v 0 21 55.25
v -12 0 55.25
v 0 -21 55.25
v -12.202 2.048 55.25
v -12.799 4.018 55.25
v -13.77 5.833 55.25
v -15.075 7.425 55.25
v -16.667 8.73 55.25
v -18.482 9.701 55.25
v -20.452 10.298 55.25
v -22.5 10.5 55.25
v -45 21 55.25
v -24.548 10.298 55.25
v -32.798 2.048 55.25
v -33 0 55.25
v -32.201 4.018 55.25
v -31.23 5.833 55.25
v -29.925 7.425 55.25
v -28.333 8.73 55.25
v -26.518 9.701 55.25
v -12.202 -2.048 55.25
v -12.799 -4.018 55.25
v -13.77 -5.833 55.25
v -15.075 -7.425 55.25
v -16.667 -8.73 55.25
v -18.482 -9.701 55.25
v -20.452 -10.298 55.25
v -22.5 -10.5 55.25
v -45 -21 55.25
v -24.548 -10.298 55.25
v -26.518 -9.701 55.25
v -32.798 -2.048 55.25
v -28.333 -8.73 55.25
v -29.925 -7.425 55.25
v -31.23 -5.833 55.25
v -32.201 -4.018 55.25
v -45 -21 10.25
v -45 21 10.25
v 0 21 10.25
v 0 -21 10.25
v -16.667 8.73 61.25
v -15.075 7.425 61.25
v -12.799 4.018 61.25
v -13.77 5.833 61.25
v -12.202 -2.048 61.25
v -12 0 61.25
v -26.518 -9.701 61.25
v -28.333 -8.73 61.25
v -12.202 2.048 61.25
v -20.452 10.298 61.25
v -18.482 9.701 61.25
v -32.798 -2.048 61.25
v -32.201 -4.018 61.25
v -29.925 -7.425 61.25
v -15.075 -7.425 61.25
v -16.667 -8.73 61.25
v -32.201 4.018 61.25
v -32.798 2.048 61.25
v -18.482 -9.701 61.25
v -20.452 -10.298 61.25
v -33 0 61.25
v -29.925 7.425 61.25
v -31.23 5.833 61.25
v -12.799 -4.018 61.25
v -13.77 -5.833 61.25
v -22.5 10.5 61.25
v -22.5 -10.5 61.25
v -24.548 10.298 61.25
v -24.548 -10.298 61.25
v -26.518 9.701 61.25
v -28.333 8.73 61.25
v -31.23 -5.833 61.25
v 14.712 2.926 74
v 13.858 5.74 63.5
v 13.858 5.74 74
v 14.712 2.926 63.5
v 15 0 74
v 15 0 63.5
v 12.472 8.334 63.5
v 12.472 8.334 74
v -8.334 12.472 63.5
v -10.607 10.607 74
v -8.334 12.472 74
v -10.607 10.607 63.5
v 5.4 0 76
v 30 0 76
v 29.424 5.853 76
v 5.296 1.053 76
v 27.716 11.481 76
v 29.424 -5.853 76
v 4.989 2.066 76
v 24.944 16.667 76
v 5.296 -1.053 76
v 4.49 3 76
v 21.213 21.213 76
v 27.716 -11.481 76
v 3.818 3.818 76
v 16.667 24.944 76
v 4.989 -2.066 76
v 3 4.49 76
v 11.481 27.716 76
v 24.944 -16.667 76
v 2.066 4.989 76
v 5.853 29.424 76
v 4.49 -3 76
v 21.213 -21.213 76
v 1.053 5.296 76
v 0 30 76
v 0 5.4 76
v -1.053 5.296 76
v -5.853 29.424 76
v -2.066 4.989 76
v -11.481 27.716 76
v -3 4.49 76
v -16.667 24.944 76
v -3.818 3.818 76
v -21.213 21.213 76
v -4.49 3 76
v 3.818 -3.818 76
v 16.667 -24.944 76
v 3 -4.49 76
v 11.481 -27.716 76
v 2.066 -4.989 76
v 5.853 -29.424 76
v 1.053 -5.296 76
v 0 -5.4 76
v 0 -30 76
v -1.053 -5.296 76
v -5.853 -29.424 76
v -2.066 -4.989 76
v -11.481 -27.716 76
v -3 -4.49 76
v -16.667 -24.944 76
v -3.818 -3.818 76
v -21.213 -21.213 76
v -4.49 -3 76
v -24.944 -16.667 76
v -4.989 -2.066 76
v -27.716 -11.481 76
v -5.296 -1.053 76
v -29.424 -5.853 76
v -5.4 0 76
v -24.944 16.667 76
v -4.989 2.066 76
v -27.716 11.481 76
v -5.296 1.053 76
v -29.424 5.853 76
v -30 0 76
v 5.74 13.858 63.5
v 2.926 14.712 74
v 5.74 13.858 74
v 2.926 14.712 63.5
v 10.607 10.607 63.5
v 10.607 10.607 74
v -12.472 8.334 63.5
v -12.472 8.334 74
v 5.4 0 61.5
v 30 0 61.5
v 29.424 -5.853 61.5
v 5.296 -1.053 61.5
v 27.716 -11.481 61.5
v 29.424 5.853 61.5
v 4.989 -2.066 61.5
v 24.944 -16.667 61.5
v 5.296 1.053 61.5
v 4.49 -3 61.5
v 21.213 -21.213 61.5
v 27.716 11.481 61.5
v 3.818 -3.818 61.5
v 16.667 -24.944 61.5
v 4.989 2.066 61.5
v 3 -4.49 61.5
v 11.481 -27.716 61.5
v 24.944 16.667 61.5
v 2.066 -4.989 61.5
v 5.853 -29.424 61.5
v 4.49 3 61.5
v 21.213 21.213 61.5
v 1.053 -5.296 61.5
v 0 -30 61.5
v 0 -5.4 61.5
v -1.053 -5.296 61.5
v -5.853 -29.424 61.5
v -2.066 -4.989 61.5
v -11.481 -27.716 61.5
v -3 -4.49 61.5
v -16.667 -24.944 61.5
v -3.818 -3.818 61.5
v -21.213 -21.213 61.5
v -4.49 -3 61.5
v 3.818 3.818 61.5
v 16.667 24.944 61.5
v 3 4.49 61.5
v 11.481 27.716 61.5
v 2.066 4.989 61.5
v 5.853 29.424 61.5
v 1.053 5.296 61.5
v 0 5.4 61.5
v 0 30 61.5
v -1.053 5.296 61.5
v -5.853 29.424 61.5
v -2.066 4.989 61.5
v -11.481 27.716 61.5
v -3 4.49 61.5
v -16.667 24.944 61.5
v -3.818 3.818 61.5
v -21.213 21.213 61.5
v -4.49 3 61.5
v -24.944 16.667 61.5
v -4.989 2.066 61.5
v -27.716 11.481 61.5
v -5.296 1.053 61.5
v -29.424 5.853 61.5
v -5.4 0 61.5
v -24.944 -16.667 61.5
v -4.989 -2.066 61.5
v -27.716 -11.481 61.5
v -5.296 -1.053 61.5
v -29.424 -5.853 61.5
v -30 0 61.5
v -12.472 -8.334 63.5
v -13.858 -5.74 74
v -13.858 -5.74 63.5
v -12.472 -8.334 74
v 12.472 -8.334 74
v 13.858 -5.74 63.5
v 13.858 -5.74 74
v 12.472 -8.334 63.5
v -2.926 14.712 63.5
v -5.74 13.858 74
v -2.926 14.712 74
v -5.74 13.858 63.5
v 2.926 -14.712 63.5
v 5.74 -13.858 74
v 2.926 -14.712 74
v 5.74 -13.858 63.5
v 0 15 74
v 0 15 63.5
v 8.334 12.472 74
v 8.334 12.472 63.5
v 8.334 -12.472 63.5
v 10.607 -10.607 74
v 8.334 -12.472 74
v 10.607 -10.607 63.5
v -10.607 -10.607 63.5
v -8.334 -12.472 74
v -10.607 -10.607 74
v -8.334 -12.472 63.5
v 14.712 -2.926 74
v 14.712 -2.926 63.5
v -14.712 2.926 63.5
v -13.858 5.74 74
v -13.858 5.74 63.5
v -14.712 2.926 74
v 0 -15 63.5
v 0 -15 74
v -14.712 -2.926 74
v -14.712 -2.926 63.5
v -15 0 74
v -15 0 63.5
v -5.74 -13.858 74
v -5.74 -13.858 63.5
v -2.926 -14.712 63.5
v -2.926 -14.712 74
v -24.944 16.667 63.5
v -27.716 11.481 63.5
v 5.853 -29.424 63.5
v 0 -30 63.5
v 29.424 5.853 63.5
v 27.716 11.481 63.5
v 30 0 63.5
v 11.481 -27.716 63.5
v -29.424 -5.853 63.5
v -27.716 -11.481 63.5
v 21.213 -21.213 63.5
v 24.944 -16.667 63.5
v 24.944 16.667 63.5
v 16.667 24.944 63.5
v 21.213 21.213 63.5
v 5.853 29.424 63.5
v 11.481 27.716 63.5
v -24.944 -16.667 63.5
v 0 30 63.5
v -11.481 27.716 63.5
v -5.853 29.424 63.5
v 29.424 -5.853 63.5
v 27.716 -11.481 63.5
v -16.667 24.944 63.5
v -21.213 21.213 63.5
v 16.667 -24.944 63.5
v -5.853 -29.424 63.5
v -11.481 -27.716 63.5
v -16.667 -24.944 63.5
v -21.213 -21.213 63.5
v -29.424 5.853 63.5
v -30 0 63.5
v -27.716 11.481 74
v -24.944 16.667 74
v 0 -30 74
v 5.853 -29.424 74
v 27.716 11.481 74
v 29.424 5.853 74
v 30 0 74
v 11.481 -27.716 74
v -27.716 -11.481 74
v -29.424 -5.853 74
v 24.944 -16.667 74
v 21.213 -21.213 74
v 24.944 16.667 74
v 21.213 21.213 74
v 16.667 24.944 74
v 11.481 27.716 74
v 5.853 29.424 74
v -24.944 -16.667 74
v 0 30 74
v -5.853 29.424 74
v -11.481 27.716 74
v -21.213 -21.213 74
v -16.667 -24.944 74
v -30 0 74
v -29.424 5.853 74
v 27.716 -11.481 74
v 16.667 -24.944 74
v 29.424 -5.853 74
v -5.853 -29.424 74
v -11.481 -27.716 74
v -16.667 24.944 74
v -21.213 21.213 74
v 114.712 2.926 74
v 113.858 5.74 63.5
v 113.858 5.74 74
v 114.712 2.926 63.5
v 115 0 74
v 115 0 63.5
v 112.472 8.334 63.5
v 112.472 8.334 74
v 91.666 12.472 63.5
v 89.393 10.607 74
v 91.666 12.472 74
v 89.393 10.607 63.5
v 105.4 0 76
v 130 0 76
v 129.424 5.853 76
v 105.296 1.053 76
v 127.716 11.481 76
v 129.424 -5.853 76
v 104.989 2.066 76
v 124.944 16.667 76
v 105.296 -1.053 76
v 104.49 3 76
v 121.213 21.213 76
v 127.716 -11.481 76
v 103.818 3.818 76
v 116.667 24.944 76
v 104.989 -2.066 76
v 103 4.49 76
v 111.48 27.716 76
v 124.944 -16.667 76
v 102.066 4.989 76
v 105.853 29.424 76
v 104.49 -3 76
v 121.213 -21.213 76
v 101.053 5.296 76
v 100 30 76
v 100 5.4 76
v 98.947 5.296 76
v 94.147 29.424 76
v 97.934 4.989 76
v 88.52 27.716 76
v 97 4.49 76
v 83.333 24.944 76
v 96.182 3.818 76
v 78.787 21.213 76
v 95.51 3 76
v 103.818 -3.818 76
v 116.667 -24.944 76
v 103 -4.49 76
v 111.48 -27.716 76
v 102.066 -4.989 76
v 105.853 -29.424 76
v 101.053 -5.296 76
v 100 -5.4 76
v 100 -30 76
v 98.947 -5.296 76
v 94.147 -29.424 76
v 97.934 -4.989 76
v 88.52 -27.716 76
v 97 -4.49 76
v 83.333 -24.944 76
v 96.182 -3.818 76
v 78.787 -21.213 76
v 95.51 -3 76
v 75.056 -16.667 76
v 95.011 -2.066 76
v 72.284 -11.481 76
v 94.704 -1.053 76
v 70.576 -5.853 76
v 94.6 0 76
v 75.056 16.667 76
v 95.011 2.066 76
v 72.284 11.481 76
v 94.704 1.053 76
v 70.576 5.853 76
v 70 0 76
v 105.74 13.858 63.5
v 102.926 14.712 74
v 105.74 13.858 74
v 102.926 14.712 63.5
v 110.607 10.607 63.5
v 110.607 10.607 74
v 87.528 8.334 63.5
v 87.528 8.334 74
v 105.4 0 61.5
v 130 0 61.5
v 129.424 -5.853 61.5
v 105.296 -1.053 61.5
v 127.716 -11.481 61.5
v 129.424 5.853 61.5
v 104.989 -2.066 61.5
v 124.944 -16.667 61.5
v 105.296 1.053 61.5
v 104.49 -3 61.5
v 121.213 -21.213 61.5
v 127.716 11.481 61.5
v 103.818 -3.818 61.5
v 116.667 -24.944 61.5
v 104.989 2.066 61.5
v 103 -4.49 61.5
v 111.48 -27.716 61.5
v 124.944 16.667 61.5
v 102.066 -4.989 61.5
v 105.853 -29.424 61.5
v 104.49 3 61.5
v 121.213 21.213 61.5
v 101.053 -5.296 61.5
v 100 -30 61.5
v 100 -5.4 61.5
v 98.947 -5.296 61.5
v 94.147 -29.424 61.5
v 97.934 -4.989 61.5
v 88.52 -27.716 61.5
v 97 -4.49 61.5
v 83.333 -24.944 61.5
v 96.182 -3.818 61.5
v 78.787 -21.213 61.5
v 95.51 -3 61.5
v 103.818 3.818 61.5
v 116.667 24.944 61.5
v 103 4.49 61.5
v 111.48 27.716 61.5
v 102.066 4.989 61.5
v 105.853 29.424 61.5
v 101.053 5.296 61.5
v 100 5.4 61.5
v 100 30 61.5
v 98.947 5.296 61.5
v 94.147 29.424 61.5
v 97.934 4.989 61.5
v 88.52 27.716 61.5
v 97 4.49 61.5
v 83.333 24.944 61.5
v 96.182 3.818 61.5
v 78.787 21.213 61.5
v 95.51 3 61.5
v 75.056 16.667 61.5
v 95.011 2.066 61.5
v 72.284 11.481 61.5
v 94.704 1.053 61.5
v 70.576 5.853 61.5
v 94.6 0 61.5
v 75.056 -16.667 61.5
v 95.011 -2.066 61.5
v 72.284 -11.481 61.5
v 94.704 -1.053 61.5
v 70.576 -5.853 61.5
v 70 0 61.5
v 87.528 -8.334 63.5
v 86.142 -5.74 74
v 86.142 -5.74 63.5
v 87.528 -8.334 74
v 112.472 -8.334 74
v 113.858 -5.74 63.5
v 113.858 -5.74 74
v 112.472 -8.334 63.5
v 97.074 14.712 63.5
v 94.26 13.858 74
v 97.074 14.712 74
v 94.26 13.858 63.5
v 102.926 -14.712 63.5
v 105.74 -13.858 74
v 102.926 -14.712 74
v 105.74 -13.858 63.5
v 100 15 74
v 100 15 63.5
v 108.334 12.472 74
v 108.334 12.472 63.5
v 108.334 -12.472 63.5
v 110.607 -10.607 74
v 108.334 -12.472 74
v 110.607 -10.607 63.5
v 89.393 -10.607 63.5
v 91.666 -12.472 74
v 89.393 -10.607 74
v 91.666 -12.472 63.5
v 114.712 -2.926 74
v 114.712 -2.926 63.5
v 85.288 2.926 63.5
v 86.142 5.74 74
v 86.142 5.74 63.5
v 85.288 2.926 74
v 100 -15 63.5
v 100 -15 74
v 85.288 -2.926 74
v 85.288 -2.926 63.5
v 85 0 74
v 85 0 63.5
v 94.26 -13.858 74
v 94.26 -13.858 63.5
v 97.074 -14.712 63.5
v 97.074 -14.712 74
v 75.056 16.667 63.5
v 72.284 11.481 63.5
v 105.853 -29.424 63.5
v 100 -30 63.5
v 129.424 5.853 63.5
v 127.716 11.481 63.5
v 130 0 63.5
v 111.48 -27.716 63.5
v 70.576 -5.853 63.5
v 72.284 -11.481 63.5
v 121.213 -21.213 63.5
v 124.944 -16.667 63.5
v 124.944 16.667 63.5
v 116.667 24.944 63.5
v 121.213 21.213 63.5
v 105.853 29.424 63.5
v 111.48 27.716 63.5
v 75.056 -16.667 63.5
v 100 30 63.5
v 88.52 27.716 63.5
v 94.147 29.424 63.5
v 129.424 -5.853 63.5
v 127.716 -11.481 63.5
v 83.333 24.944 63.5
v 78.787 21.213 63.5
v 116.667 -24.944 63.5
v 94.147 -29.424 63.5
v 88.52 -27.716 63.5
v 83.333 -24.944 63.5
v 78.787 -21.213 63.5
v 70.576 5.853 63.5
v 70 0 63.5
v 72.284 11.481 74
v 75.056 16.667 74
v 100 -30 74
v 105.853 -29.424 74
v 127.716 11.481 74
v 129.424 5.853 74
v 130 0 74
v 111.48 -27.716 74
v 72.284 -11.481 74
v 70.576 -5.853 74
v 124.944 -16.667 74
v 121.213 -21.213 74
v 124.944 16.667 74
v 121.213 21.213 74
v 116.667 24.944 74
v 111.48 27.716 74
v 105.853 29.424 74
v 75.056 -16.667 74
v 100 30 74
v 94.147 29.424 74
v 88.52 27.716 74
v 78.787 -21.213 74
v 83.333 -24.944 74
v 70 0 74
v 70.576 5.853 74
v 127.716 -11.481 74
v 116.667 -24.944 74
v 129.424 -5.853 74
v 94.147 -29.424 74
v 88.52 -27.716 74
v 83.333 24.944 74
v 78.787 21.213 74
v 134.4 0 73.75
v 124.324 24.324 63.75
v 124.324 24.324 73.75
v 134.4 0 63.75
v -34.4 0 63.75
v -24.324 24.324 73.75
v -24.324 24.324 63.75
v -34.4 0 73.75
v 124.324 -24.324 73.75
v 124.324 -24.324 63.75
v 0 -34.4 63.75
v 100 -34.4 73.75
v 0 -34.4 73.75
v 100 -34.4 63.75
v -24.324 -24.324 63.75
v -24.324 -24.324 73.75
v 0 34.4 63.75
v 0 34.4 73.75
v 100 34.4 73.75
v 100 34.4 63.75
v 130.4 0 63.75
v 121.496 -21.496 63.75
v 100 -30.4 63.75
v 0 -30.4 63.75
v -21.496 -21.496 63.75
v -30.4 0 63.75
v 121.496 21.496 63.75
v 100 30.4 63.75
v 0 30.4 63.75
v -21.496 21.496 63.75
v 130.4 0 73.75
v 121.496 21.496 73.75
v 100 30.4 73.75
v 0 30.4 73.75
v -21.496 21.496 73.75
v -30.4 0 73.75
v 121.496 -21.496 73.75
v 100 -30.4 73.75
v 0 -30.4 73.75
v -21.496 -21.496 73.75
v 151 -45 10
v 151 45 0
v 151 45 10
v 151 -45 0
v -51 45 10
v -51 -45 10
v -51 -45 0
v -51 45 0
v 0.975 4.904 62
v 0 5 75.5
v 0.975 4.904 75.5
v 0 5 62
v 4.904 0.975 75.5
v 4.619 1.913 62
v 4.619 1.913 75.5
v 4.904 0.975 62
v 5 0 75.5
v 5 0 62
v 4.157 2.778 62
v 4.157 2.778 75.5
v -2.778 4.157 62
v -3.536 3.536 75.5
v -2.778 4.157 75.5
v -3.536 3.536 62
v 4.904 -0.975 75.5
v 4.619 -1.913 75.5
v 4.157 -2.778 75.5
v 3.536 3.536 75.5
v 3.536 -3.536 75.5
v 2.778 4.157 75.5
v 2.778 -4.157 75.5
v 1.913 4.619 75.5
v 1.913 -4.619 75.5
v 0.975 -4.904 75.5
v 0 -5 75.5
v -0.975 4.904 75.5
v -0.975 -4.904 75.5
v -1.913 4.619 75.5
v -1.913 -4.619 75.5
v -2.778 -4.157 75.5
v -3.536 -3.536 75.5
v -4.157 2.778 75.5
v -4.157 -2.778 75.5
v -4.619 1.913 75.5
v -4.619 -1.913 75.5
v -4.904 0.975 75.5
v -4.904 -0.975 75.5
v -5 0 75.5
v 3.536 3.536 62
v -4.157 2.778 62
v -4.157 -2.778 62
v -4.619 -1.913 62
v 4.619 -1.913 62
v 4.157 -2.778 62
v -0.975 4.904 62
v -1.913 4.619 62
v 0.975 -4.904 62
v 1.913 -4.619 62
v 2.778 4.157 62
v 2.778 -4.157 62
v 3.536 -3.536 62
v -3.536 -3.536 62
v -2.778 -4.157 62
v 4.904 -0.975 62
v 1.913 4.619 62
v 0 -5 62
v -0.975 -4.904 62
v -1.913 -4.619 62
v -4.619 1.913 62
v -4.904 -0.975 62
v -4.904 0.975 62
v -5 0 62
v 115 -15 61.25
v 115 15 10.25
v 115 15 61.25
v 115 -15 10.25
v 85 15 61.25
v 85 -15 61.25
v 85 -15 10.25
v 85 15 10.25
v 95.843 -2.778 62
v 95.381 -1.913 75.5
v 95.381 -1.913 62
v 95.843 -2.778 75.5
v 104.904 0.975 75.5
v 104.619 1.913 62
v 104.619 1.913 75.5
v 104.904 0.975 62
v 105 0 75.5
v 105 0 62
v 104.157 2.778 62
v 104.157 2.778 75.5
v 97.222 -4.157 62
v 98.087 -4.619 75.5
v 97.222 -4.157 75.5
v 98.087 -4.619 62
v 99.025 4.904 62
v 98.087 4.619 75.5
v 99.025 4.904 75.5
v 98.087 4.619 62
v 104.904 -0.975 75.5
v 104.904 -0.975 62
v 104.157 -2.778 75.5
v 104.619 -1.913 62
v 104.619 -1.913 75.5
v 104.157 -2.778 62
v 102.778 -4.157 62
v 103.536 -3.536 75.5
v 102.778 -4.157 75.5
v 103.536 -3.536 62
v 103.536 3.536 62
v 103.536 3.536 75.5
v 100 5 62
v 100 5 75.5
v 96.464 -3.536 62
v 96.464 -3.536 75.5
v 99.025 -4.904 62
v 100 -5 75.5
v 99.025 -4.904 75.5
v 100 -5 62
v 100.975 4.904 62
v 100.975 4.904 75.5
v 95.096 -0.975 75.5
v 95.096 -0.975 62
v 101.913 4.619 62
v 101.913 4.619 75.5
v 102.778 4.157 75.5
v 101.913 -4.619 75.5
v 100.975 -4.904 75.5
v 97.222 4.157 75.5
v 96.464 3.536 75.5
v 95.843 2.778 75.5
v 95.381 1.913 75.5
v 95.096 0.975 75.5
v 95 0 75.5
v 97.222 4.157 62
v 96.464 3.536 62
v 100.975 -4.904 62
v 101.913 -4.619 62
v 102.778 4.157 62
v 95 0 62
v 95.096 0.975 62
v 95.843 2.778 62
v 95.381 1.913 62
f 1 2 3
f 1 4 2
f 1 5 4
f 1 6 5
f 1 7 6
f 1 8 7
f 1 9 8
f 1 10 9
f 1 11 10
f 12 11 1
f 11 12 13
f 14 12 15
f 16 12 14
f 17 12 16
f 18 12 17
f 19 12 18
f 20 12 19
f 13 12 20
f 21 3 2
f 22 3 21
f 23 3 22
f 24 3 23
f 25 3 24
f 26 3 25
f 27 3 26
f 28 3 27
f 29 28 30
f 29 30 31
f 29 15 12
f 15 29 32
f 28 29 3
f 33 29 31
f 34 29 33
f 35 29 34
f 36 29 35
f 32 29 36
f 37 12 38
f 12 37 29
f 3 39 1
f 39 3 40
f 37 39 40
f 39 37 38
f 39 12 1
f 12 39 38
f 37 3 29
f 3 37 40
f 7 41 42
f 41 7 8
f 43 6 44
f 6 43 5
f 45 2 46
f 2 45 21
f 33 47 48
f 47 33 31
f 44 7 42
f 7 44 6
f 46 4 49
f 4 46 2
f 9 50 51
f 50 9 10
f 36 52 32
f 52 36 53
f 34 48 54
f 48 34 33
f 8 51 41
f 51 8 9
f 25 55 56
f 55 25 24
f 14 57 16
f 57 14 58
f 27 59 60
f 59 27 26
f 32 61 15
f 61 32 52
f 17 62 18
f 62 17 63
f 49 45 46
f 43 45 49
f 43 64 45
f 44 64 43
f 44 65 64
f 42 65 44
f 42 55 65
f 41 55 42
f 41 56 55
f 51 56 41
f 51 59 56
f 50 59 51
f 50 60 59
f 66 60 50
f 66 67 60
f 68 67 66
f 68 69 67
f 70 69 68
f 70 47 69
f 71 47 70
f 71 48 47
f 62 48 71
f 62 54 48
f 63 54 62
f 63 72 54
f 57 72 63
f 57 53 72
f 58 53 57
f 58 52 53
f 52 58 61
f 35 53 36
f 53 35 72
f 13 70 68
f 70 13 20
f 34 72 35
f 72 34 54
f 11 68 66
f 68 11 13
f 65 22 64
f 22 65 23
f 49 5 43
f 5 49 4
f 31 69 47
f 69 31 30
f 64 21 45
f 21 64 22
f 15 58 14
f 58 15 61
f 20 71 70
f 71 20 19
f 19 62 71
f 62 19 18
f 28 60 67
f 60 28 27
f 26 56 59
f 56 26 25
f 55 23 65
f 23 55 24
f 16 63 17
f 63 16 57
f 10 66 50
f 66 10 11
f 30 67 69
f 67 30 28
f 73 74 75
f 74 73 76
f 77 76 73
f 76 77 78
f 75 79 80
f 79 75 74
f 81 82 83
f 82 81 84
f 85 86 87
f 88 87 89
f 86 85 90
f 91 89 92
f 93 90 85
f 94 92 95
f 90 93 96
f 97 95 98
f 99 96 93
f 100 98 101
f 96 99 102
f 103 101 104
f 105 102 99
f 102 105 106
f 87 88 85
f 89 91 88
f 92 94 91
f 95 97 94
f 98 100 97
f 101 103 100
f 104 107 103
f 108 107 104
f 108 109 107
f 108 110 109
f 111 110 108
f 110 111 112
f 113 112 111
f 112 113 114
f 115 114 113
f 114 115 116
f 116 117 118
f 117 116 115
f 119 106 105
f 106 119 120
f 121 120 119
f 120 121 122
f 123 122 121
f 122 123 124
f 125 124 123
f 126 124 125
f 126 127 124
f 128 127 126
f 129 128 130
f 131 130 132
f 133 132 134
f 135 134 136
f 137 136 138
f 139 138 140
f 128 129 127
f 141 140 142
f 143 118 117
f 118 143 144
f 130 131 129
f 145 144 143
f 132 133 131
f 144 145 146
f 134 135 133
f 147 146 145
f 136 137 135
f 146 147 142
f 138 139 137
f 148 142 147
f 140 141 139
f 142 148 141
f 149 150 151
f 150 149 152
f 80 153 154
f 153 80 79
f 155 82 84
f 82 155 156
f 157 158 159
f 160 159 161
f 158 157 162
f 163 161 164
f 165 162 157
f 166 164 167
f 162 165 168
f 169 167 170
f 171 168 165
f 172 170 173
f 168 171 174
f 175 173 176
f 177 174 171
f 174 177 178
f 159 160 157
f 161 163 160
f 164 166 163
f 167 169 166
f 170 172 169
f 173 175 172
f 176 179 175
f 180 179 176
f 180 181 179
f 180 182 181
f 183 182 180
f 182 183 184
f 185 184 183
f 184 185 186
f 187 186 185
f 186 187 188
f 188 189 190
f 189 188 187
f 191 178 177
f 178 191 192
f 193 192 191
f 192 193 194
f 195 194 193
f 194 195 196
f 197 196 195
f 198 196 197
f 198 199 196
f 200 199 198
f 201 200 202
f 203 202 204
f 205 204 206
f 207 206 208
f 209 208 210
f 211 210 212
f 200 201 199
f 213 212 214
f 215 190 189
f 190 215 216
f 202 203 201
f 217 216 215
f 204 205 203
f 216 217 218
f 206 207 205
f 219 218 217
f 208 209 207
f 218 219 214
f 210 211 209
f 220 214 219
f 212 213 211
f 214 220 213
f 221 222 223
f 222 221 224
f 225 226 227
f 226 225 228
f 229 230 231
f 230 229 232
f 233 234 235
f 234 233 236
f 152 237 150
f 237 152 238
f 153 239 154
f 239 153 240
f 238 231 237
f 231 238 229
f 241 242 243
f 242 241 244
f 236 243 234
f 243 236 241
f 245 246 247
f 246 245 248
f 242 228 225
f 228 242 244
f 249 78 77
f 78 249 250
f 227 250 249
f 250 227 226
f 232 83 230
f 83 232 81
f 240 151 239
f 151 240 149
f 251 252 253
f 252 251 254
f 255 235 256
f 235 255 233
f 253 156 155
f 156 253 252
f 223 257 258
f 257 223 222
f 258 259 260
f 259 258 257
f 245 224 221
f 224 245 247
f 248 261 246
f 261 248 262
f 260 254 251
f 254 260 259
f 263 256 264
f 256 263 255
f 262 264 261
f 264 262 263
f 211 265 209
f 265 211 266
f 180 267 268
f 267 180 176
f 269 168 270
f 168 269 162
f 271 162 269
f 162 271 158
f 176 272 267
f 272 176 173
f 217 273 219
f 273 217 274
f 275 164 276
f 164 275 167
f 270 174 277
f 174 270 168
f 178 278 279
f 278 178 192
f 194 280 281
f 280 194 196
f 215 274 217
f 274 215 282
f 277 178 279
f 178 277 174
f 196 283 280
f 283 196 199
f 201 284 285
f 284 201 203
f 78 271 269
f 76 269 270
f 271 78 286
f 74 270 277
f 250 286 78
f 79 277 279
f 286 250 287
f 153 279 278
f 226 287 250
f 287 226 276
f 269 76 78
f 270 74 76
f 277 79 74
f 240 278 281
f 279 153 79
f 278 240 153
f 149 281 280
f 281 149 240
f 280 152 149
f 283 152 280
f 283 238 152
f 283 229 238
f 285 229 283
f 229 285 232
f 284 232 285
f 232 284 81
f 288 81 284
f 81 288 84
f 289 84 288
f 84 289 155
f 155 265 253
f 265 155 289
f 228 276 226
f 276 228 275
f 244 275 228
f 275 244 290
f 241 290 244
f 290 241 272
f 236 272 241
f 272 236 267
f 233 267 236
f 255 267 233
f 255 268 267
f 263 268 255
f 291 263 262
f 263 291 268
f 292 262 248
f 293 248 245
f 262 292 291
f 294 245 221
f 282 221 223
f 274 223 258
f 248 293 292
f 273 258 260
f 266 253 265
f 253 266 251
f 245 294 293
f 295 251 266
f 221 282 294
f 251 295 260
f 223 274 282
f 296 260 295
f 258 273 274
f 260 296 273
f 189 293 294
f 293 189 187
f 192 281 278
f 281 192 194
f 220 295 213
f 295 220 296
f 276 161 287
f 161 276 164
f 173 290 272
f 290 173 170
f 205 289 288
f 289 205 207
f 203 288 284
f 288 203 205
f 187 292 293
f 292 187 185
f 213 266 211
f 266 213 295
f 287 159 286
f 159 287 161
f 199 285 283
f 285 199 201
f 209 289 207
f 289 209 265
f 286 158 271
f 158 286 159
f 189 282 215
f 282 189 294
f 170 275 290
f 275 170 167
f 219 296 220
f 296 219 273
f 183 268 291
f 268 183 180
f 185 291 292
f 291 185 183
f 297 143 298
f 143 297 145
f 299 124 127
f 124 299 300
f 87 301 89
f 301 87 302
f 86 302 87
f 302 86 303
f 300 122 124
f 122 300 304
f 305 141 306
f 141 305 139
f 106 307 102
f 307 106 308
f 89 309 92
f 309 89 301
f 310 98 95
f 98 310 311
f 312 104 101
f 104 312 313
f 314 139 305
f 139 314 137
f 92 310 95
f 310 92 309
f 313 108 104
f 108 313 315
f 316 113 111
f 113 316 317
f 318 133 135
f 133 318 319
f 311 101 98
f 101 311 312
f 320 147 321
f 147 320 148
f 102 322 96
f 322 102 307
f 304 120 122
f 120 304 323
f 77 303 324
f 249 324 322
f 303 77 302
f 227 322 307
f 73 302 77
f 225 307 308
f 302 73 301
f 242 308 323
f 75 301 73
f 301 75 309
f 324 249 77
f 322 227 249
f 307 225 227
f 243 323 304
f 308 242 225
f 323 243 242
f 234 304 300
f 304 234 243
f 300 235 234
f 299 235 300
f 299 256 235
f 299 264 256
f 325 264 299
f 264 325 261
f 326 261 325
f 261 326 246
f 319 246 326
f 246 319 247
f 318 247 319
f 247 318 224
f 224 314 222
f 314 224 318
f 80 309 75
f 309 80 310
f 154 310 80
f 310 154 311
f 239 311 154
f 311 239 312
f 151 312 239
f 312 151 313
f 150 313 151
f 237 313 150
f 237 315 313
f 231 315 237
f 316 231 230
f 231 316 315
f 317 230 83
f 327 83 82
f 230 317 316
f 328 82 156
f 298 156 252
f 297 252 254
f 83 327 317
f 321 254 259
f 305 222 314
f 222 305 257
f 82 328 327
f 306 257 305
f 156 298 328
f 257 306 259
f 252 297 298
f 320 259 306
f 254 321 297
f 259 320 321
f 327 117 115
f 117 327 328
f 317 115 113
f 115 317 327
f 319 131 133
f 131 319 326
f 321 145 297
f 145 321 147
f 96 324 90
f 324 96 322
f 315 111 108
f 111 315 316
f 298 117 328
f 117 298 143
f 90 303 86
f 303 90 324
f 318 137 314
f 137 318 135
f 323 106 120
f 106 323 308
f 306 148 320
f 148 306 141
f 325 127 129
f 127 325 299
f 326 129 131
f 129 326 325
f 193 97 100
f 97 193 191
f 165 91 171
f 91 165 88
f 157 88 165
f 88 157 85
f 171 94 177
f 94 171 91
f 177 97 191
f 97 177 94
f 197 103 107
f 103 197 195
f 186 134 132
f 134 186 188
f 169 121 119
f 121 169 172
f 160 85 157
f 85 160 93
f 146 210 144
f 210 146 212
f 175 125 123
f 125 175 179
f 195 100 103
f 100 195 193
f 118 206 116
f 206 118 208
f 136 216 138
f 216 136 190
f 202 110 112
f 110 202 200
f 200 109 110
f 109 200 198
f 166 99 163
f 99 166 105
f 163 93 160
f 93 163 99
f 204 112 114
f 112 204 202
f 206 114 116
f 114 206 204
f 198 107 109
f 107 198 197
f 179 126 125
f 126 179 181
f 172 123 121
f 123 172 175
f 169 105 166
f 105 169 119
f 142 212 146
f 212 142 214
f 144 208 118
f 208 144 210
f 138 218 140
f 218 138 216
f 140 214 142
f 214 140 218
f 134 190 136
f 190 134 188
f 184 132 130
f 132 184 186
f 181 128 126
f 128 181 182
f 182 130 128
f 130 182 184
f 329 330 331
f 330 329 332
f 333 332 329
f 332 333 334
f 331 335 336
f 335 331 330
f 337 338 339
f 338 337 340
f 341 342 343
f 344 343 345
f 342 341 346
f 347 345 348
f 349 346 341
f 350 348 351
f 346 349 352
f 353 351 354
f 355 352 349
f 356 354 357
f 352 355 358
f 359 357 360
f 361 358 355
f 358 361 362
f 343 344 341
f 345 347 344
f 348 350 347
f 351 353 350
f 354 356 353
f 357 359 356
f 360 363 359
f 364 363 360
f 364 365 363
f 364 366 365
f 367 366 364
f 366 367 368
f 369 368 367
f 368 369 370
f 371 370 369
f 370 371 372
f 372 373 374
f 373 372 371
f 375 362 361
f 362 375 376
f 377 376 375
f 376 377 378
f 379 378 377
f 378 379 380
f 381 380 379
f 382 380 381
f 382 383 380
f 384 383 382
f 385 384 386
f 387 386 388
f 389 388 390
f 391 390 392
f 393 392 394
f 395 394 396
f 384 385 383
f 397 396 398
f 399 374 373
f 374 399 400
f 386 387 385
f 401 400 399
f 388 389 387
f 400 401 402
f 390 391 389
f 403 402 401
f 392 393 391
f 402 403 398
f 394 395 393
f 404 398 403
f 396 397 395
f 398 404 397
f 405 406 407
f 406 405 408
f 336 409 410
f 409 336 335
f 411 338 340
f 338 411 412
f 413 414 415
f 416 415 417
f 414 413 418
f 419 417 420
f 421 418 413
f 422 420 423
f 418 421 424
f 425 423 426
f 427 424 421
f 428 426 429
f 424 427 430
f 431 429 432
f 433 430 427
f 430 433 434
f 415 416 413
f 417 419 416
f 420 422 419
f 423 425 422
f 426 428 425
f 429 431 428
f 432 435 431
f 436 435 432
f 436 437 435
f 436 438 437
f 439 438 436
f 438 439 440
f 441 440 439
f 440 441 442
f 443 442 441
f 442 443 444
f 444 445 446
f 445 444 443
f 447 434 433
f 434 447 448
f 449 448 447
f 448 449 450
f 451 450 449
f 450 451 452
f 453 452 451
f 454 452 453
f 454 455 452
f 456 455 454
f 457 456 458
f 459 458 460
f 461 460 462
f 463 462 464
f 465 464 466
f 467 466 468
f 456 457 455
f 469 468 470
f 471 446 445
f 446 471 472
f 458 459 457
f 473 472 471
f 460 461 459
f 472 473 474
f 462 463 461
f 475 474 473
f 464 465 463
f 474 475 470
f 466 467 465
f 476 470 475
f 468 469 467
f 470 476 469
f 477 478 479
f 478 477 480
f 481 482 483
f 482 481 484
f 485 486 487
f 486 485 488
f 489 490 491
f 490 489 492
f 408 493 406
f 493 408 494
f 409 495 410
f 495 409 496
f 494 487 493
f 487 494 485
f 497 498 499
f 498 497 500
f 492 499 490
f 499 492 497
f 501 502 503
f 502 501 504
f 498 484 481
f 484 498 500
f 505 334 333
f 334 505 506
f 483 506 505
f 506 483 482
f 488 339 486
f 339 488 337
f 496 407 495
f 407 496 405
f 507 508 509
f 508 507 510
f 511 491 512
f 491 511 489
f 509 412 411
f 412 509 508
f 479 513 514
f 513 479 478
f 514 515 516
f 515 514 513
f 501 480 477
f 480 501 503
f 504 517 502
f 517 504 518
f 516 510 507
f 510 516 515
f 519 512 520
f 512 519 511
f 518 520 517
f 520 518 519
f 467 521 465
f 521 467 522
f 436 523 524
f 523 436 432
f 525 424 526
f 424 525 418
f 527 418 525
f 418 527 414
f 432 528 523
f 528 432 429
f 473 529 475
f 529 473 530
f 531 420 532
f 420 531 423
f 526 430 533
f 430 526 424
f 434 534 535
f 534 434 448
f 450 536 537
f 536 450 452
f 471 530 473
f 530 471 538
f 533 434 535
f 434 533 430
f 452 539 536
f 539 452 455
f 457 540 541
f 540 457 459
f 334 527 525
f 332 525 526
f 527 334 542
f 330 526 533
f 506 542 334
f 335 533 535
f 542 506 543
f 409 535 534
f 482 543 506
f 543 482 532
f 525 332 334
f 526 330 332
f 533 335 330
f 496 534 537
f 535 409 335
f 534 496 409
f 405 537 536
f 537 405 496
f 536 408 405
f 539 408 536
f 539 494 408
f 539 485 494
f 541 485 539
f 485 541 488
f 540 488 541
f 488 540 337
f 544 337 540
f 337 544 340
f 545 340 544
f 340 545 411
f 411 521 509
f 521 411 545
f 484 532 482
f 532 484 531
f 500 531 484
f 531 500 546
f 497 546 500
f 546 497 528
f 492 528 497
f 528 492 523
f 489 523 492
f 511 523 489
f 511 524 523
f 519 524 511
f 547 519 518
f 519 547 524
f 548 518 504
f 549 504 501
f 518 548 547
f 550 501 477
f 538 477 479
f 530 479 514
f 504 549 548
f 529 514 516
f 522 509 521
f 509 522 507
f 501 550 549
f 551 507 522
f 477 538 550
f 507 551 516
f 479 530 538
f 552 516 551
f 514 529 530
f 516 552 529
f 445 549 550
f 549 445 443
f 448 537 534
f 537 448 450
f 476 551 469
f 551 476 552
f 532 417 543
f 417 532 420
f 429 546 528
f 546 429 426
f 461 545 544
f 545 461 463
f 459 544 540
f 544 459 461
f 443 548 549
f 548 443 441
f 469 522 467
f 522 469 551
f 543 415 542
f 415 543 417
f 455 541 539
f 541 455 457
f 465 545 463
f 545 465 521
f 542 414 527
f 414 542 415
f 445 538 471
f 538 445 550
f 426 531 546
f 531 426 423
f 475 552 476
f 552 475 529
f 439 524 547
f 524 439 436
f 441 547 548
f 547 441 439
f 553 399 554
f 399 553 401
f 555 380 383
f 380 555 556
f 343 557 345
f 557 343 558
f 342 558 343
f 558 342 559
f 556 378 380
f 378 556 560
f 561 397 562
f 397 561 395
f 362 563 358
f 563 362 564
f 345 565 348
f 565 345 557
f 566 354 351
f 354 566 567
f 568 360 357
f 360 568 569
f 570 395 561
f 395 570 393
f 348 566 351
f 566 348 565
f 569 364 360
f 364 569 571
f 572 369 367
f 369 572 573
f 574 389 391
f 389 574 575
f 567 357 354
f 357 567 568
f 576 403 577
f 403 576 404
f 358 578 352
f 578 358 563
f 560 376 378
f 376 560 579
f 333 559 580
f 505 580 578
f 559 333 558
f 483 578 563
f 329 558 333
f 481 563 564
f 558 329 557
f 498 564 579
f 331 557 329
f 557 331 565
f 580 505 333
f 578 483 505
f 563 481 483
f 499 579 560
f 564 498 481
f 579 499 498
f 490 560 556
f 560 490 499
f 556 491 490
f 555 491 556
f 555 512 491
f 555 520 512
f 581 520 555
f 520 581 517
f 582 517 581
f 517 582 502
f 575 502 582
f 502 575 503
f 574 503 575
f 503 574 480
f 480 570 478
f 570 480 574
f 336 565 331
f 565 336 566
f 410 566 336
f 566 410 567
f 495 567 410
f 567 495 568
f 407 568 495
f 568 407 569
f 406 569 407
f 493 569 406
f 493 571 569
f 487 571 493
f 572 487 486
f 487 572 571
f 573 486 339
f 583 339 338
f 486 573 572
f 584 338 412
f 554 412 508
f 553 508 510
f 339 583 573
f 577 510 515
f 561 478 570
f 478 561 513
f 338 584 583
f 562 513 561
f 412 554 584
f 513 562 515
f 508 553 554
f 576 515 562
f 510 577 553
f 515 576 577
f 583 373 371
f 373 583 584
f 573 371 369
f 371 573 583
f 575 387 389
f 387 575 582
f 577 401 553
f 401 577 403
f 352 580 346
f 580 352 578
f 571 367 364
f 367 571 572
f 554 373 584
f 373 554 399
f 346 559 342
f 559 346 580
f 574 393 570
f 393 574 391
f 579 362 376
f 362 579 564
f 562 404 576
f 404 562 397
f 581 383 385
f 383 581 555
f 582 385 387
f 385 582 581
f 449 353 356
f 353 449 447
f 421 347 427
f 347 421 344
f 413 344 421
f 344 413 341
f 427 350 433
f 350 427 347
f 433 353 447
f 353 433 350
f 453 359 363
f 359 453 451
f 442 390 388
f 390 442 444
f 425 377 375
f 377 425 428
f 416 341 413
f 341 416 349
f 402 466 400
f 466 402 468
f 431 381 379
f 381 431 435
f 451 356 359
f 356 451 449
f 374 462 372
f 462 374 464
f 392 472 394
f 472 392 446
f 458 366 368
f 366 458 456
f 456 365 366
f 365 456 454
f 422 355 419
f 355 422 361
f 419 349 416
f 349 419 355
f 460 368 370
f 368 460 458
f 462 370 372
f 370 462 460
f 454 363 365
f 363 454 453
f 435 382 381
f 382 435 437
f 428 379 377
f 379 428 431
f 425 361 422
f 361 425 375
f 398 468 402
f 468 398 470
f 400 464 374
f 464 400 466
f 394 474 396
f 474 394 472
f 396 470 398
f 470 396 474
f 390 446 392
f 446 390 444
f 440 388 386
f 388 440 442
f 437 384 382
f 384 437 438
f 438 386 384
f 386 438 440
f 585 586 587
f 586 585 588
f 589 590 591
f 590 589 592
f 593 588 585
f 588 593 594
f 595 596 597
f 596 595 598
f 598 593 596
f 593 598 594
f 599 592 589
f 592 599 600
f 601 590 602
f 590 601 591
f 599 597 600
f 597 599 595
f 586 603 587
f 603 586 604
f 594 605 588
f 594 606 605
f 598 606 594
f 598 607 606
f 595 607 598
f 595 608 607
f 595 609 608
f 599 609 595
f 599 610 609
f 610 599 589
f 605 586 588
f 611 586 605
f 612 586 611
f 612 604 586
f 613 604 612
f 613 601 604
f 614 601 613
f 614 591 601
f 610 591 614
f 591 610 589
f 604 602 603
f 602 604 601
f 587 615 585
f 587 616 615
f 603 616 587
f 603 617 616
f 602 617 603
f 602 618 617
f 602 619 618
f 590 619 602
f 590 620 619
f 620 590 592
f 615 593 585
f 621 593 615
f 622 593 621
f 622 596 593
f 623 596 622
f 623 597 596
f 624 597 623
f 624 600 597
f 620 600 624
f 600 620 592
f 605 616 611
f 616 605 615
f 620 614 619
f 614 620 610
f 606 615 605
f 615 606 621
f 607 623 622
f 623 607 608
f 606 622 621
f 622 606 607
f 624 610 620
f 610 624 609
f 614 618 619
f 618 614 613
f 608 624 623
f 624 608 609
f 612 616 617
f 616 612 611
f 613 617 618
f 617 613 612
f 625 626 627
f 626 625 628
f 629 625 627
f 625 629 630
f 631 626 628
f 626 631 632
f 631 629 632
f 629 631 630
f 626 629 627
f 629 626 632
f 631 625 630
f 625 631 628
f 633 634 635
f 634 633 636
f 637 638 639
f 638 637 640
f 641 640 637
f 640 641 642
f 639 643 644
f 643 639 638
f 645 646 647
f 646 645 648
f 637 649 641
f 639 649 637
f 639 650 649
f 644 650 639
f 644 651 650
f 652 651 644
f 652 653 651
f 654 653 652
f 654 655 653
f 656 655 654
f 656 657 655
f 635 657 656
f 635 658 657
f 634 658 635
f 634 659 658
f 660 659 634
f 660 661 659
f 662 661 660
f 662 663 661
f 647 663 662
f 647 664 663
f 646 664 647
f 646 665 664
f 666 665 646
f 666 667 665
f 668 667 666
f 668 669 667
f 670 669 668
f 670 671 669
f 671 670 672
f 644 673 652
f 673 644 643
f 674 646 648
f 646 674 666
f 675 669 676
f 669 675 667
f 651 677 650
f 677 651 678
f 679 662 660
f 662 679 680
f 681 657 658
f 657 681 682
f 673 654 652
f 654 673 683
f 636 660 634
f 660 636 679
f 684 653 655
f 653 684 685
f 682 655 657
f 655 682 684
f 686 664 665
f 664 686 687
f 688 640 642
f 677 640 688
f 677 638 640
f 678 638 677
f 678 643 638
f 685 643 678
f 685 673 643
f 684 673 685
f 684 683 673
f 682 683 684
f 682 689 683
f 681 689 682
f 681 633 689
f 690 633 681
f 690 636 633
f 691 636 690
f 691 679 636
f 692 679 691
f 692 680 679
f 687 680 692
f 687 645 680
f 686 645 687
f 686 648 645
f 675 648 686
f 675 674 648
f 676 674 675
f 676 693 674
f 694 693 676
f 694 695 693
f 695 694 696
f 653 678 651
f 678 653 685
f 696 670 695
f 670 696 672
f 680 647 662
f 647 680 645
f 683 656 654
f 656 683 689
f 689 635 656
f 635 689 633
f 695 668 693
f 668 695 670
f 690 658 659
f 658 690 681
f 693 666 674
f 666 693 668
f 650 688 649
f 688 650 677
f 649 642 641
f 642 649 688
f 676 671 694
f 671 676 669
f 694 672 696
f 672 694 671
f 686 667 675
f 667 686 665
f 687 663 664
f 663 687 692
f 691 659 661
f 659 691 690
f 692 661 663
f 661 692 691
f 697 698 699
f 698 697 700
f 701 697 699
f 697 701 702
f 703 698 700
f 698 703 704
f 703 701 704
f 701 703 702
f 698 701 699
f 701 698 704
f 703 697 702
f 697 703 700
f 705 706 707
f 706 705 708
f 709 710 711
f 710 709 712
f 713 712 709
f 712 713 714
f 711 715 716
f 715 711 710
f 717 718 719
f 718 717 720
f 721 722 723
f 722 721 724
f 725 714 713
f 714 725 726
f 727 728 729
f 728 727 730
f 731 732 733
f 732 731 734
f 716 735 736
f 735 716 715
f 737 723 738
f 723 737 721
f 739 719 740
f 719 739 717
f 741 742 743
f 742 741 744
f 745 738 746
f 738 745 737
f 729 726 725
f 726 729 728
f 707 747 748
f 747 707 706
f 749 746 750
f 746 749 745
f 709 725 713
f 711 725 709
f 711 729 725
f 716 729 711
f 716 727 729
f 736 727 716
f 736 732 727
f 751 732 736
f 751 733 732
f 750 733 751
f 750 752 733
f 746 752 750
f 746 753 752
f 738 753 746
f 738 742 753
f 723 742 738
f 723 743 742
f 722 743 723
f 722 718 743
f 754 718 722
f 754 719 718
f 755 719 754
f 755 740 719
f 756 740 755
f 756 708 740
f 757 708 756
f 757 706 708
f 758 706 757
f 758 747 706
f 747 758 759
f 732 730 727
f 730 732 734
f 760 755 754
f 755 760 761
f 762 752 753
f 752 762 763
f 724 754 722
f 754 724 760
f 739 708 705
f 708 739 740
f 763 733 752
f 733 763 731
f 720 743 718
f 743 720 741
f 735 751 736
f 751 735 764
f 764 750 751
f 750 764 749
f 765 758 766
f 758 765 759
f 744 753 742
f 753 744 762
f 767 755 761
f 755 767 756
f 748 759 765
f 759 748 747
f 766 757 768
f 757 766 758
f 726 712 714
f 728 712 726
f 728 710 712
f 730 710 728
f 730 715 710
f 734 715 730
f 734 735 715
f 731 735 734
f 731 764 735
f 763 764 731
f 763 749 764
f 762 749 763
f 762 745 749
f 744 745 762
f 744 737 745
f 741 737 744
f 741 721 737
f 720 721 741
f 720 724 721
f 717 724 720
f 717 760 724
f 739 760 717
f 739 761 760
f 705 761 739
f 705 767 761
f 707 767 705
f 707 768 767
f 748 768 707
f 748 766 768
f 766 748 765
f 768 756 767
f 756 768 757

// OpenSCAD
$fn = 32;

// ------------------------------------------------------------------------
// Motor belt drive: span 100 mm, pulleys d60, belt 10 mm wide
// Every part is its own module, assembly() places every instance.
// ------------------------------------------------------------------------

// --- part 1 ---
module base_plate() {
  difference() {
    translate([-101, -45, 0]) cube([202, 90, 10]);
  }
}

// --- part 2 ---
module motor() {
  union() {
    translate([-22.5, -21, 0]) cube([45, 42, 45]);
    translate([25.5, 0, 22.5]) rotate([0, 90, 0]) cylinder(h = 6, d = 21, center = true);
  }
}

// --- part 3 ---
module drive_shaft() {
  translate([0, 0, -6.75]) cylinder(h = 13.5, d = 10);
}

// --- part 4 ---
module pulley_drive() {
  difference() {
    union() {
      cylinder(h = 14.5, d = 30);
      cylinder(h = 2, d = 60);
      translate([0, 0, 12.5]) cylinder(h = 2, d = 60);
    }
    translate([0, 0, -1]) cylinder(h = 16.5, d = 10.8);
  }
}

// --- part 5 ---
module idler_post() {
  translate([-15, -15, 0]) cube([30, 30, 51]);
}

// --- part 6 ---
module driven_shaft() {
  translate([0, 0, -6.75]) cylinder(h = 13.5, d = 10);
}

// --- part 7 ---
module pulley_driven() {
  difference() {
    union() {
      cylinder(h = 14.5, d = 30);
      cylinder(h = 2, d = 60);
      translate([0, 0, 12.5]) cylinder(h = 2, d = 60);
    }
    translate([0, 0, -1]) cylinder(h = 16.5, d = 10.8);
  }
}

// --- part 8 ---
module drive_belt() {
  difference() {
    linear_extrude(height = 10) polygon(points = concat([for (a = [90 : 45 : 270]) [34.4 * cos(a), 34.4 * sin(a)]], [for (a = [270 : 45 : 450]) [100 + 34.4 * cos(a), 34.4 * sin(a)]]));
    translate([0, 0, -1]) linear_extrude(height = 12) polygon(points = concat([for (a = [90 : 45 : 270]) [30.4 * cos(a), 30.4 * sin(a)]], [for (a = [270 : 45 : 450]) [100 + 30.4 * cos(a), 30.4 * sin(a)]]));
  }
}

// --- assembly ---
module assembly() {
  color([0.80, 0.24, 0.20]) translate([50, 0, 0]) rotate([0, 0, 0]) base_plate();
  color([0.20, 0.45, 0.75]) translate([0, 0, 32.75]) rotate([0, 270, 0]) motor();
  color([0.25, 0.62, 0.32]) translate([0, 0, 68.75]) rotate([0, 0, 0]) drive_shaft();
  color([0.92, 0.70, 0.18]) translate([0, 0, 61.5]) rotate([0, 0, 0]) pulley_drive();
  color([0.58, 0.35, 0.70]) translate([100, 0, 10.25]) rotate([0, 0, 0]) idler_post();
  color([0.16, 0.66, 0.66]) translate([100, 0, 68.75]) rotate([0, 0, 0]) driven_shaft();
  color([0.85, 0.48, 0.18]) translate([100, 0, 61.5]) rotate([0, 0, 0]) pulley_driven();
  color([0.55, 0.60, 0.65]) translate([0, 0, 63.75]) rotate([0, 0, 0]) drive_belt();
}

assembly();
